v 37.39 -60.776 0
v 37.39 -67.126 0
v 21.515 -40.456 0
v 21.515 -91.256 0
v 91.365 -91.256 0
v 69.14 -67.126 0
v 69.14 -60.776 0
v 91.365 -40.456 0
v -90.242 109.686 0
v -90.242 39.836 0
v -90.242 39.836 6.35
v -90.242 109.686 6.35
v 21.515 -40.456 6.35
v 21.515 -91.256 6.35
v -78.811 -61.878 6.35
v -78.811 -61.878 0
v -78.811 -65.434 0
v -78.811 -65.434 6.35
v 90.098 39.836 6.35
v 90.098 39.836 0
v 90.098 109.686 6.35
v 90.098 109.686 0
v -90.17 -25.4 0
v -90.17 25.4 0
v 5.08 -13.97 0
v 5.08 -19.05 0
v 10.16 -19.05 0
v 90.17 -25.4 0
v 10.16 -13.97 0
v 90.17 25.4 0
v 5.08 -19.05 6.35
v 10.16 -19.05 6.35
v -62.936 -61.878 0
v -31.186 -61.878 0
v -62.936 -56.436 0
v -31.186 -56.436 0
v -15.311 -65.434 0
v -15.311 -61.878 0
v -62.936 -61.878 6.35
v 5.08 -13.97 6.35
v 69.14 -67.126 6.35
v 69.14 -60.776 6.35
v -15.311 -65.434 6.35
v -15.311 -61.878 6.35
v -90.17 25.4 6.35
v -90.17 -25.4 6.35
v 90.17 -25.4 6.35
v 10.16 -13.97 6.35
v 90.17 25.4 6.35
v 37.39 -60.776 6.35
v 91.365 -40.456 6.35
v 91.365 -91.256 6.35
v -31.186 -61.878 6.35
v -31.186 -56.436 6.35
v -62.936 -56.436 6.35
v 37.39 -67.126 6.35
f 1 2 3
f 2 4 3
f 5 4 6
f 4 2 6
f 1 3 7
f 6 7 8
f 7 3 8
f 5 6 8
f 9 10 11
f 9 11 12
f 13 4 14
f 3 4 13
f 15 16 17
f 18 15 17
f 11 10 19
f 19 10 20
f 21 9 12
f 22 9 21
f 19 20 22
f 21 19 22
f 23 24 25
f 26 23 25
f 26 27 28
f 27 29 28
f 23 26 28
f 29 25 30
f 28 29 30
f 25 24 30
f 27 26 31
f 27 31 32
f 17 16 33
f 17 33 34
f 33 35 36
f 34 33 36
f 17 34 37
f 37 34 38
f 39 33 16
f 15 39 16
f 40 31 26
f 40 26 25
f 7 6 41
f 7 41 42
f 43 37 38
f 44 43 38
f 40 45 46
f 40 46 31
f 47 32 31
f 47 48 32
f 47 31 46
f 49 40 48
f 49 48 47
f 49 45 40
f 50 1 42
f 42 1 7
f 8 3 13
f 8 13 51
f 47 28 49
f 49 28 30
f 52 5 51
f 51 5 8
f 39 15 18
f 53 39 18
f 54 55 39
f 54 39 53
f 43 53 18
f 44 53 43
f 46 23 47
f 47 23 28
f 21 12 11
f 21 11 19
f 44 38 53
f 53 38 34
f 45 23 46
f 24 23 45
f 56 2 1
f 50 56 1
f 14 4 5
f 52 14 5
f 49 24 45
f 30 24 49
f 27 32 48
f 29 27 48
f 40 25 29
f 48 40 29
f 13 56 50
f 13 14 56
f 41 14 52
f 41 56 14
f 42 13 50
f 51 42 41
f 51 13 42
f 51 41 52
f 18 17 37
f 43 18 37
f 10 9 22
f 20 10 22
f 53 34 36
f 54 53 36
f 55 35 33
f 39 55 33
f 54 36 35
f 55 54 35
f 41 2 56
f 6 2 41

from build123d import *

# Parameters (mm, degrees)
F0_W     = 180.34
F0_H     = 50.8
F0_W_2   = 5.08
F0_H_2   = 5.08
F1_DEPTH = 6.35
F2_W     = 69.85
F2_H     = 50.8
F2_W_2   = 31.75
F2_H_2   = 6.35
F3_DEPTH = 6.35
F4_W     = 180.34
F4_H     = 69.85
F5_DEPTH = 6.35
F7_DEPTH = 6.35


with BuildPart() as f1:
    # F0 (on Top) → F1 (new body)
    with BuildSketch(Plane.XY):
        Rectangle(F0_W, F0_H)
        with Locations((7.62, -16.51)):
            Rectangle(F0_W_2, F0_H_2, mode=Mode.SUBTRACT)
    extrude(amount=F1_DEPTH)


with BuildPart() as f3:
    # F2 (on Top) → F3 (new body)
    with BuildSketch(Plane.XY):
        with Locations((56.439783, -65.855933)):
            Rectangle(F2_W, F2_H)
        with Locations((53.264783, -63.950933)):
            Rectangle(F2_W_2, F2_H_2, mode=Mode.SUBTRACT)
    extrude(amount=F3_DEPTH)


with BuildPart() as f5:
    # F4 (on Top) → F5 (new body)
    with BuildSketch(Plane.XY):
        with Locations((-0.072438, 74.761368)):
            Rectangle(F4_W, F4_H)
    extrude(amount=F5_DEPTH)


with BuildPart() as f7:
    # F6 (on Top) → F7 (new body)
    with BuildSketch(Plane.XY):
        Polygon((-62.93563, -61.877686), (-78.81063, -61.877686), (-78.81063, -65.433686), (-15.31063, -65.433686), (-15.31063, -61.877686), (-31.18563, -61.877686), (-31.18563, -56.435704), (-62.93563, -56.435704), align=None)
    extrude(amount=F7_DEPTH)


solid = Compound([f1.part, f3.part, f5.part, f7.part])
